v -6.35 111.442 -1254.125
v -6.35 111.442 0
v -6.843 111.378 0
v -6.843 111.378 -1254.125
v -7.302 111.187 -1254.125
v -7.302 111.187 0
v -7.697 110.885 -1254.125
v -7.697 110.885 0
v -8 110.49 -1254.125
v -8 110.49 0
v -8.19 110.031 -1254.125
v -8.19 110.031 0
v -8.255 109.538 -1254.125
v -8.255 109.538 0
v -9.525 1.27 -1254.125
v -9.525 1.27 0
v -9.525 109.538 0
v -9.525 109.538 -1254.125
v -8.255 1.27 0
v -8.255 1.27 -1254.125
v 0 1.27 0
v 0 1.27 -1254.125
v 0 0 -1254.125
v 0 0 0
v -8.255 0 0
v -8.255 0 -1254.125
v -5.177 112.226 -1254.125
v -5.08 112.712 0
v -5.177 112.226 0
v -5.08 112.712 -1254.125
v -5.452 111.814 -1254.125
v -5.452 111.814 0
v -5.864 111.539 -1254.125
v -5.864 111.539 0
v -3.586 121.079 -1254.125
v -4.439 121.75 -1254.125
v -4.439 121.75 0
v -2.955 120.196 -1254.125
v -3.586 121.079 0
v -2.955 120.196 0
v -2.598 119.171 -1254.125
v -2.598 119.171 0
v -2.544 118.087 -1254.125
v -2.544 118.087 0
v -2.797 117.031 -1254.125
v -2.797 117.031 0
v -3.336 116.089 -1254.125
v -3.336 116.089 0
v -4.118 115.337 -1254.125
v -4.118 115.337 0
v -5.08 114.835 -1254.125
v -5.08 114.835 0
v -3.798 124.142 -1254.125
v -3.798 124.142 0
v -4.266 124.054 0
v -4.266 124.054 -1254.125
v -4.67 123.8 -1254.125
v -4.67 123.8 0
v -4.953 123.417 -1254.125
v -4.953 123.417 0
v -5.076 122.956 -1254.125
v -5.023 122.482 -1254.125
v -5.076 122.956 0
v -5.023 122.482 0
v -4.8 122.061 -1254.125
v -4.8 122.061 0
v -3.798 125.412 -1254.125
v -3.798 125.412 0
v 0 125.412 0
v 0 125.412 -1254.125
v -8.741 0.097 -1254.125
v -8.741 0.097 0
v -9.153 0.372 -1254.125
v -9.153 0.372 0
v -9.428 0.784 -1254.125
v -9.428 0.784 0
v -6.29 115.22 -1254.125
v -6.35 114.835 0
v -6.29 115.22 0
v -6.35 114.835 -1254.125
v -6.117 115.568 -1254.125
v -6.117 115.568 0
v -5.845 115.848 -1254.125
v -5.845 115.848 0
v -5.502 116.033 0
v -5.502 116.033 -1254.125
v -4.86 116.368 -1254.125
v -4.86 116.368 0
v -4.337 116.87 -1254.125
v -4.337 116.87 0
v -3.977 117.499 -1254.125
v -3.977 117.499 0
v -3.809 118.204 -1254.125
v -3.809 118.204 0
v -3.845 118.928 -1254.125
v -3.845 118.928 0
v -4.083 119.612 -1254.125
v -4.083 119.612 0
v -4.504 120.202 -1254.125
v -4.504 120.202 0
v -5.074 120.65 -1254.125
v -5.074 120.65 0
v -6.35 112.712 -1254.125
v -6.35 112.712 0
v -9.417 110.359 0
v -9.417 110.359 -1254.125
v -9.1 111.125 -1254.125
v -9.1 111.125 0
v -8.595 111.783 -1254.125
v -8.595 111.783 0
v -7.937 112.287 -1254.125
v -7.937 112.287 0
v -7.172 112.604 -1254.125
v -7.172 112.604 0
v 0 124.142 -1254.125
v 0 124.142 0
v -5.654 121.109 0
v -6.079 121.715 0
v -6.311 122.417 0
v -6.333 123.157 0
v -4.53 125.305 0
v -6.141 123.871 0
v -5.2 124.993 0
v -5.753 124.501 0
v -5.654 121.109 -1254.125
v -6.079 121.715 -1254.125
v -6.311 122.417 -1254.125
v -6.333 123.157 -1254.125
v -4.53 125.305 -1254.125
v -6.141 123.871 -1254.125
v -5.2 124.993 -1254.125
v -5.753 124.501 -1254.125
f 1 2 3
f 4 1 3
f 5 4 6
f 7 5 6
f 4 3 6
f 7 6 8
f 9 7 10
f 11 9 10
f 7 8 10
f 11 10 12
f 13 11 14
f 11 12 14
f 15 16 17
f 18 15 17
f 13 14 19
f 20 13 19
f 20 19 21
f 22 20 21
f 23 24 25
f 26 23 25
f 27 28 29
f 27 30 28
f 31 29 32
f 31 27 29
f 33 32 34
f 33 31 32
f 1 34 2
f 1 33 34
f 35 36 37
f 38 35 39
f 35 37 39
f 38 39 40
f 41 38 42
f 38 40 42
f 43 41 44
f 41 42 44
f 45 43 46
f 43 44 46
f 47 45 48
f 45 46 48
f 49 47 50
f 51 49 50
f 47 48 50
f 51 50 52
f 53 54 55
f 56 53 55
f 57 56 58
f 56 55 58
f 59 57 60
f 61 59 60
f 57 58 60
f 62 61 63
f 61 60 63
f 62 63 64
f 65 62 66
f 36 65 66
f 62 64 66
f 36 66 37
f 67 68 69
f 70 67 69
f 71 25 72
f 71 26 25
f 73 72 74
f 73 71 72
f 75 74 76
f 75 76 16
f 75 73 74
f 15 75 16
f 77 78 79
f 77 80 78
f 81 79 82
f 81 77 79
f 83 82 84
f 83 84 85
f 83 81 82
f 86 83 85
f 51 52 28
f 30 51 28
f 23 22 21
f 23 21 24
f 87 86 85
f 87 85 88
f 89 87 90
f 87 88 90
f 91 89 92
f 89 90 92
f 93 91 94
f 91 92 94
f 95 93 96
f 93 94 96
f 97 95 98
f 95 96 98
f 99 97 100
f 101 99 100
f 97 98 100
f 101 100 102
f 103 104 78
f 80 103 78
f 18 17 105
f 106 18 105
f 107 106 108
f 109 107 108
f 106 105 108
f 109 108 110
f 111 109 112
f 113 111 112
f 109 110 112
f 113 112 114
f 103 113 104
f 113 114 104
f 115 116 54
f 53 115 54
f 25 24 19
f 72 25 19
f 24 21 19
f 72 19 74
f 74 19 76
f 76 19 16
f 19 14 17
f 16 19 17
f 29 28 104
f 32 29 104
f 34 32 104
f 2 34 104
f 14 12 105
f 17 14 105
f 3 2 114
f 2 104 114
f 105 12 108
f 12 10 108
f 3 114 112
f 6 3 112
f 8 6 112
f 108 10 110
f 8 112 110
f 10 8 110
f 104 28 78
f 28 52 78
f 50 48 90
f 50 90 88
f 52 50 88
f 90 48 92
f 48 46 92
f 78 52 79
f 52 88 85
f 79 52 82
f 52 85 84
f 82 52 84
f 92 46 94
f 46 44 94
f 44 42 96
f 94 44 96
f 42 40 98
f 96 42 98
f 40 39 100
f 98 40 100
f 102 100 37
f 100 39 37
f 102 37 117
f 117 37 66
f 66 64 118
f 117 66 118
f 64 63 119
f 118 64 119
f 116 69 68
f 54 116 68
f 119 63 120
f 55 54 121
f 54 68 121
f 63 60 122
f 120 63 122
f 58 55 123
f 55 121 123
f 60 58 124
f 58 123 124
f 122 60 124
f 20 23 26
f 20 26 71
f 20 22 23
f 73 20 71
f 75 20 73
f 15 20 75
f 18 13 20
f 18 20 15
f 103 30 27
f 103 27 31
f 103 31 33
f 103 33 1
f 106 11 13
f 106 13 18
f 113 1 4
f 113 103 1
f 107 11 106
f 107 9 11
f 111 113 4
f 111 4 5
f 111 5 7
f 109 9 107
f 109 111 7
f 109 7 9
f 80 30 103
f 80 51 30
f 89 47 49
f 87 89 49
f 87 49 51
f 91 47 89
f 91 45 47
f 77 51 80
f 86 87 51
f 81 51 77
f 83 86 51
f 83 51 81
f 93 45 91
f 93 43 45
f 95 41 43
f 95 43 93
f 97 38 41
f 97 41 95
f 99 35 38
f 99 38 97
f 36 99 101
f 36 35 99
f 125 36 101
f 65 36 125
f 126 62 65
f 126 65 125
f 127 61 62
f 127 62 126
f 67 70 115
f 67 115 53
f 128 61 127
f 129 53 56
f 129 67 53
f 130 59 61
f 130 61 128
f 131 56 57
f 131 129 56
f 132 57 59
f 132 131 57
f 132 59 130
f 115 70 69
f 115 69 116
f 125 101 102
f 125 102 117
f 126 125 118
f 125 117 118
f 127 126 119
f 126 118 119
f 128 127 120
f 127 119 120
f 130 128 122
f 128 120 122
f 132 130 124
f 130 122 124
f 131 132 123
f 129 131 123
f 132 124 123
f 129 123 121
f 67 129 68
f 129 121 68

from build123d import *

# Parameters (mm, degrees)
EXTRUDE_THIN1_DEPTH = 1254.125
FILLET1_R           = 1.27


with BuildPart() as part:
    # Sketch1 → Extrude-Thin1 (new body)
    with BuildSketch(Plane.XY):
        with BuildLine():
            Line((0, 0), (-9.525, 0))
            Line((-9.525, 0), (-9.525, 109.5375))
            ThreePointArc((-9.525, 109.5375), (-8.59506403, 111.78256403), (-6.35, 112.7125))
            Line((-6.35, 112.7125), (-6.35, 115.8875))
            ThreePointArc((-6.35, 115.8875), (-3.884748595, 117.779153935), (-5.073891971, 120.65))
            ThreePointArc((-5.073891971, 120.65), (-6.263035347, 123.520846065), (-3.797783942, 125.4125))
            Line((-3.797783942, 125.4125), (0, 125.4125))
            Line((0, 125.4125), (0, 124.1425))
            Line((0, 124.1425), (-3.797783942, 124.1425))
            ThreePointArc((-3.797783942, 124.1425), (-5.036309547, 123.192145878), (-4.438891971, 121.749852263))
            ThreePointArc((-4.438891971, 121.749852263), (-2.544105078, 118.08687128), (-5.08, 114.834659111))
            Line((-5.08, 114.834659111), (-5.08, 110.957403166))
            ThreePointArc((-5.08, 110.957403166), (-7.127712993, 111.27651912), (-8.255, 109.5375))
            Line((-8.255, 109.5375), (-8.255, 1.27))
            Line((-8.255, 1.27), (0, 1.27))
            Line((0, 1.27), (0, 0))
        make_face()
    extrude(amount=-EXTRUDE_THIN1_DEPTH)

    # Fillet1
    fillet1_edges = [part.edges().sort_by_distance(p)[0] for p in [
        (-5.08, 110.957403166, -627.0625),
        (-9.525, 0, -627.0625),
        (-6.35, 115.8875, -627.0625),
    ]]
    fillet(fillet1_edges, radius=FILLET1_R)


solid = part.part
